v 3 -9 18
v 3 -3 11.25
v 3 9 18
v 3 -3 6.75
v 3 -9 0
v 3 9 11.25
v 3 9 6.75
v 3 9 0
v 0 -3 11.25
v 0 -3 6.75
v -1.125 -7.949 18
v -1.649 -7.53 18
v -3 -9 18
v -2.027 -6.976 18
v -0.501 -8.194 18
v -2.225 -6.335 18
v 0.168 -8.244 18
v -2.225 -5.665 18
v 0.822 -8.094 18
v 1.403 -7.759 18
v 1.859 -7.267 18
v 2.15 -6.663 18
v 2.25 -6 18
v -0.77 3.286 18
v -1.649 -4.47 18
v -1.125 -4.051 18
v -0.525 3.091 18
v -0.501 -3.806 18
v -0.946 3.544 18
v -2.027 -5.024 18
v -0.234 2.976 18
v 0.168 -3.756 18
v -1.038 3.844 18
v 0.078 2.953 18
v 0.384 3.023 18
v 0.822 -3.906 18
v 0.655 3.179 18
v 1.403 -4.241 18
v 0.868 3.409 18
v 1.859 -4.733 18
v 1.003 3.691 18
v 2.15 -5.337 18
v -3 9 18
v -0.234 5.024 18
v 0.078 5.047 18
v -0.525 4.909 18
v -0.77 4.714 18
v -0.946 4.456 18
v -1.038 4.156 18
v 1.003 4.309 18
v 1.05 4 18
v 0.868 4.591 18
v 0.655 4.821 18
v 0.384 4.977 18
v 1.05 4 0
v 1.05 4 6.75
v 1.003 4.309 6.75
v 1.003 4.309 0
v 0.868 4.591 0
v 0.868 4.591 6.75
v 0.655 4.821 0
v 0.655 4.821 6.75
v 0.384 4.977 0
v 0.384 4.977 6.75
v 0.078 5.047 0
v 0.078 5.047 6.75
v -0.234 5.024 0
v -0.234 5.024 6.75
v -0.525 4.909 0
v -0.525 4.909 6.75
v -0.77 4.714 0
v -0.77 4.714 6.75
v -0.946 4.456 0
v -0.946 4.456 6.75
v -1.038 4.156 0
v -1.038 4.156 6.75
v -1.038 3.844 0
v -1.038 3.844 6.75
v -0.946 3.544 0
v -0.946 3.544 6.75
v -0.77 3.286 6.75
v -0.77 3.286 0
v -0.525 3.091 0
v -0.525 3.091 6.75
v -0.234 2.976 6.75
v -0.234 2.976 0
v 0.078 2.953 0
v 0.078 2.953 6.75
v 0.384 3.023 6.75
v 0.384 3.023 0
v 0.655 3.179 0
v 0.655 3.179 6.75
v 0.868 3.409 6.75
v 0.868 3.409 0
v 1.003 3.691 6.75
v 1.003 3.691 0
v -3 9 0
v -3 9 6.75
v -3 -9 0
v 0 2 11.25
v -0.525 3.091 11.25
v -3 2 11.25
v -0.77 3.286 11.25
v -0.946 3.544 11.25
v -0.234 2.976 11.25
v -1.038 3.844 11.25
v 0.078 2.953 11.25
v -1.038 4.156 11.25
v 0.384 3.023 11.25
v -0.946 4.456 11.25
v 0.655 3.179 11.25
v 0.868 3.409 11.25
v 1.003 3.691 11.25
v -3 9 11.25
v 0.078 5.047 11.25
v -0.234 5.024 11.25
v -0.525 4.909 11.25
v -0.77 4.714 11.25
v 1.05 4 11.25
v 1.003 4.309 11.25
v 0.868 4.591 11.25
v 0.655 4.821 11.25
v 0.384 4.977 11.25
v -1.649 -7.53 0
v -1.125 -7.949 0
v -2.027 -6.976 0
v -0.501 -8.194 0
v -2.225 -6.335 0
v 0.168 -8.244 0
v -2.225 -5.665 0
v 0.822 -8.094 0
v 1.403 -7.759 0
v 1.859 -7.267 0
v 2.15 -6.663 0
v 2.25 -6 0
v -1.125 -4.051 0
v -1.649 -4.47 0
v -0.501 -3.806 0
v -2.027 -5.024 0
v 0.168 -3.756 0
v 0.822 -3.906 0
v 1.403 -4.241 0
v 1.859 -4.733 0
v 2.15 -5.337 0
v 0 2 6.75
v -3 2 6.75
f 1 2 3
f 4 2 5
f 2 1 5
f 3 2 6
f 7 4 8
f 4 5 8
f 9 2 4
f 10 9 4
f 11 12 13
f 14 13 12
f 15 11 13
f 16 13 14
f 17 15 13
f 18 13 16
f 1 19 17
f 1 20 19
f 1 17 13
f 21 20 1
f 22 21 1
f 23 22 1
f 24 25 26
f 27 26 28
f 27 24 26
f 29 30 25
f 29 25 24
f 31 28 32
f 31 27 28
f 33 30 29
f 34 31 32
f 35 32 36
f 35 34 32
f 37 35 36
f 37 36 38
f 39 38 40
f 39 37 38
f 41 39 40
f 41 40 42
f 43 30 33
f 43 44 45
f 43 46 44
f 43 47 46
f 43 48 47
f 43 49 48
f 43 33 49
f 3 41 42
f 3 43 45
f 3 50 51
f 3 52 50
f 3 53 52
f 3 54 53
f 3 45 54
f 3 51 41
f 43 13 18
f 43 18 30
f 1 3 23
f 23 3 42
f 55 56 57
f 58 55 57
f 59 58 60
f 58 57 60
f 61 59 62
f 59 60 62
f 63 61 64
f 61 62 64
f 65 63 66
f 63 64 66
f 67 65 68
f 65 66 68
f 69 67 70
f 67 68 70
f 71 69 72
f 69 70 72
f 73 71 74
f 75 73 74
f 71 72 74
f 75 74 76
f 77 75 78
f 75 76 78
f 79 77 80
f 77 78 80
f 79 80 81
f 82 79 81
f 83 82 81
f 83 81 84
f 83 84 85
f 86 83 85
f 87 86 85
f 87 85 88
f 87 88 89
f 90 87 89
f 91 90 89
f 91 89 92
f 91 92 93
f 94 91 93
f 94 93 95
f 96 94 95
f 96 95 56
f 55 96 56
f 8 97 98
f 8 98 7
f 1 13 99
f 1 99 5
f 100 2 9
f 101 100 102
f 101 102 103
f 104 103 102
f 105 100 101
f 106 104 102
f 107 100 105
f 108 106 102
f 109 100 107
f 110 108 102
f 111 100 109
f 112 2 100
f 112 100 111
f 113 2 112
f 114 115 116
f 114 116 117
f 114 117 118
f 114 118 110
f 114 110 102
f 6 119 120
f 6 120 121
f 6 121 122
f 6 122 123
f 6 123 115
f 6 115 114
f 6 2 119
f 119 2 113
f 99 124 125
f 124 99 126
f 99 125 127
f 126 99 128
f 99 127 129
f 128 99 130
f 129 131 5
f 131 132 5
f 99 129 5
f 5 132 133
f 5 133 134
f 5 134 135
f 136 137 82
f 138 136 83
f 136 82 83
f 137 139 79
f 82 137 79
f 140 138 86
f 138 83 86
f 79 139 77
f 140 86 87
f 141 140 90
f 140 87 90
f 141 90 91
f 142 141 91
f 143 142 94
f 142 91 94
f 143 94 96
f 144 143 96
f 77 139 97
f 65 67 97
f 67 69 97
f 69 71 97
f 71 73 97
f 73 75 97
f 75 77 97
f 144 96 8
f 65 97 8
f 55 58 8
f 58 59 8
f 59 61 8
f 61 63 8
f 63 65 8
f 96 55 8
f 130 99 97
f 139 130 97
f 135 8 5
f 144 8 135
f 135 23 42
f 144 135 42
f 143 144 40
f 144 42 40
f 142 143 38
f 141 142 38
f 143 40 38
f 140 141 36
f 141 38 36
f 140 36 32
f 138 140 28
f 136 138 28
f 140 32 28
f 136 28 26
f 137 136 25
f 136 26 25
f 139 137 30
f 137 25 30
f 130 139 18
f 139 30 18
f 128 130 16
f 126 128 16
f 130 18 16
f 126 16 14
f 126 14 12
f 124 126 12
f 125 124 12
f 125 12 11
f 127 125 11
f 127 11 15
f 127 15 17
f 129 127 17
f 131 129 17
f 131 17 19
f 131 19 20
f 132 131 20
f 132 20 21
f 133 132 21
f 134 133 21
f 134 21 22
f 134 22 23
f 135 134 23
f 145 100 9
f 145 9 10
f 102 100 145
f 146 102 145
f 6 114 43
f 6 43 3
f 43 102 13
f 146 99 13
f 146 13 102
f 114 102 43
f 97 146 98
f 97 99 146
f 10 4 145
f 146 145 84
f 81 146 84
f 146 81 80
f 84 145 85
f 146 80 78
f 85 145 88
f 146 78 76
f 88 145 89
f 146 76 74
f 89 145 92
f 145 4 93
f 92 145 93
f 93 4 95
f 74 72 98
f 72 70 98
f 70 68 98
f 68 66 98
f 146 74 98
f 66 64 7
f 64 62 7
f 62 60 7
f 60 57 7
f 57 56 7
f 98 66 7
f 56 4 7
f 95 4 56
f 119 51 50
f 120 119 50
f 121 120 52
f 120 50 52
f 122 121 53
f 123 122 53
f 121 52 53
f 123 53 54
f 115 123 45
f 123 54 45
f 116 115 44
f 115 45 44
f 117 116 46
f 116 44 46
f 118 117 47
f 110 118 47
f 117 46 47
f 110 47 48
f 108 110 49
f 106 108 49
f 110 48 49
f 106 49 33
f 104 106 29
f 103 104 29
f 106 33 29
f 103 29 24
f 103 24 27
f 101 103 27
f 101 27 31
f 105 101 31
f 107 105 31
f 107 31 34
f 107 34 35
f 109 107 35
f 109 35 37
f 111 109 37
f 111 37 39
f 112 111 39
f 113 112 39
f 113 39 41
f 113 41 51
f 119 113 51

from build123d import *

# Parameters (mm, degrees)
SKETCH2_W           = 6
SKETCH2_H           = 18
BOSS_EXTRUDE1_DEPTH = 18
SKETCH3_R           = 2.25
CUT_EXTRUDE1_DEPTH  = 21.346989949
SKETCH4_W           = 4.5
SKETCH4_H           = 12
CUT_EXTRUDE2_DEPTH  = 3
SKETCH5_R           = 1.05
CUT_EXTRUDE3_DEPTH  = 21.346989949
SKETCH8_W           = 4.5
SKETCH8_H           = 7
CUT_EXTRUDE6_DEPTH  = 10


with BuildPart() as part:
    # Sketch2 → Boss-Extrude1 (new body)
    with BuildSketch(Plane.XY):
        Rectangle(SKETCH2_W, SKETCH2_H)
    extrude(amount=BOSS_EXTRUDE1_DEPTH)

    # Sketch3 → Cut-Extrude1 (cut, through all)
    with BuildSketch(Plane.XY.offset(18)):
        with Locations((0, -6)):
            Circle(SKETCH3_R)
    extrude(amount=-CUT_EXTRUDE1_DEPTH, mode=Mode.SUBTRACT)

    # Sketch4 → Cut-Extrude2 (cut)
    with BuildSketch(Plane(origin=(3, 0, 0), x_dir=(0, 0, -1), z_dir=(1, 0, 0))):
        with Locations((-9, 3)):
            Rectangle(SKETCH4_W, SKETCH4_H)
    extrude(amount=-CUT_EXTRUDE2_DEPTH, mode=Mode.SUBTRACT)

    # Sketch5 → Cut-Extrude3 (cut, through all)
    with BuildSketch(Plane.XY.offset(18)):
        with Locations((0, 4)):
            Circle(SKETCH5_R)
    extrude(amount=-CUT_EXTRUDE3_DEPTH, mode=Mode.SUBTRACT)

    # Sketch8 → Cut-Extrude6 (cut)
    with BuildSketch(Plane(origin=(3, 0, 0), x_dir=(0, 0, -1), z_dir=(1, 0, 0))):
        with Locations((-9, 5.5)):
            Rectangle(SKETCH8_W, SKETCH8_H)
    extrude(amount=-CUT_EXTRUDE6_DEPTH, mode=Mode.SUBTRACT)


solid = part.part
